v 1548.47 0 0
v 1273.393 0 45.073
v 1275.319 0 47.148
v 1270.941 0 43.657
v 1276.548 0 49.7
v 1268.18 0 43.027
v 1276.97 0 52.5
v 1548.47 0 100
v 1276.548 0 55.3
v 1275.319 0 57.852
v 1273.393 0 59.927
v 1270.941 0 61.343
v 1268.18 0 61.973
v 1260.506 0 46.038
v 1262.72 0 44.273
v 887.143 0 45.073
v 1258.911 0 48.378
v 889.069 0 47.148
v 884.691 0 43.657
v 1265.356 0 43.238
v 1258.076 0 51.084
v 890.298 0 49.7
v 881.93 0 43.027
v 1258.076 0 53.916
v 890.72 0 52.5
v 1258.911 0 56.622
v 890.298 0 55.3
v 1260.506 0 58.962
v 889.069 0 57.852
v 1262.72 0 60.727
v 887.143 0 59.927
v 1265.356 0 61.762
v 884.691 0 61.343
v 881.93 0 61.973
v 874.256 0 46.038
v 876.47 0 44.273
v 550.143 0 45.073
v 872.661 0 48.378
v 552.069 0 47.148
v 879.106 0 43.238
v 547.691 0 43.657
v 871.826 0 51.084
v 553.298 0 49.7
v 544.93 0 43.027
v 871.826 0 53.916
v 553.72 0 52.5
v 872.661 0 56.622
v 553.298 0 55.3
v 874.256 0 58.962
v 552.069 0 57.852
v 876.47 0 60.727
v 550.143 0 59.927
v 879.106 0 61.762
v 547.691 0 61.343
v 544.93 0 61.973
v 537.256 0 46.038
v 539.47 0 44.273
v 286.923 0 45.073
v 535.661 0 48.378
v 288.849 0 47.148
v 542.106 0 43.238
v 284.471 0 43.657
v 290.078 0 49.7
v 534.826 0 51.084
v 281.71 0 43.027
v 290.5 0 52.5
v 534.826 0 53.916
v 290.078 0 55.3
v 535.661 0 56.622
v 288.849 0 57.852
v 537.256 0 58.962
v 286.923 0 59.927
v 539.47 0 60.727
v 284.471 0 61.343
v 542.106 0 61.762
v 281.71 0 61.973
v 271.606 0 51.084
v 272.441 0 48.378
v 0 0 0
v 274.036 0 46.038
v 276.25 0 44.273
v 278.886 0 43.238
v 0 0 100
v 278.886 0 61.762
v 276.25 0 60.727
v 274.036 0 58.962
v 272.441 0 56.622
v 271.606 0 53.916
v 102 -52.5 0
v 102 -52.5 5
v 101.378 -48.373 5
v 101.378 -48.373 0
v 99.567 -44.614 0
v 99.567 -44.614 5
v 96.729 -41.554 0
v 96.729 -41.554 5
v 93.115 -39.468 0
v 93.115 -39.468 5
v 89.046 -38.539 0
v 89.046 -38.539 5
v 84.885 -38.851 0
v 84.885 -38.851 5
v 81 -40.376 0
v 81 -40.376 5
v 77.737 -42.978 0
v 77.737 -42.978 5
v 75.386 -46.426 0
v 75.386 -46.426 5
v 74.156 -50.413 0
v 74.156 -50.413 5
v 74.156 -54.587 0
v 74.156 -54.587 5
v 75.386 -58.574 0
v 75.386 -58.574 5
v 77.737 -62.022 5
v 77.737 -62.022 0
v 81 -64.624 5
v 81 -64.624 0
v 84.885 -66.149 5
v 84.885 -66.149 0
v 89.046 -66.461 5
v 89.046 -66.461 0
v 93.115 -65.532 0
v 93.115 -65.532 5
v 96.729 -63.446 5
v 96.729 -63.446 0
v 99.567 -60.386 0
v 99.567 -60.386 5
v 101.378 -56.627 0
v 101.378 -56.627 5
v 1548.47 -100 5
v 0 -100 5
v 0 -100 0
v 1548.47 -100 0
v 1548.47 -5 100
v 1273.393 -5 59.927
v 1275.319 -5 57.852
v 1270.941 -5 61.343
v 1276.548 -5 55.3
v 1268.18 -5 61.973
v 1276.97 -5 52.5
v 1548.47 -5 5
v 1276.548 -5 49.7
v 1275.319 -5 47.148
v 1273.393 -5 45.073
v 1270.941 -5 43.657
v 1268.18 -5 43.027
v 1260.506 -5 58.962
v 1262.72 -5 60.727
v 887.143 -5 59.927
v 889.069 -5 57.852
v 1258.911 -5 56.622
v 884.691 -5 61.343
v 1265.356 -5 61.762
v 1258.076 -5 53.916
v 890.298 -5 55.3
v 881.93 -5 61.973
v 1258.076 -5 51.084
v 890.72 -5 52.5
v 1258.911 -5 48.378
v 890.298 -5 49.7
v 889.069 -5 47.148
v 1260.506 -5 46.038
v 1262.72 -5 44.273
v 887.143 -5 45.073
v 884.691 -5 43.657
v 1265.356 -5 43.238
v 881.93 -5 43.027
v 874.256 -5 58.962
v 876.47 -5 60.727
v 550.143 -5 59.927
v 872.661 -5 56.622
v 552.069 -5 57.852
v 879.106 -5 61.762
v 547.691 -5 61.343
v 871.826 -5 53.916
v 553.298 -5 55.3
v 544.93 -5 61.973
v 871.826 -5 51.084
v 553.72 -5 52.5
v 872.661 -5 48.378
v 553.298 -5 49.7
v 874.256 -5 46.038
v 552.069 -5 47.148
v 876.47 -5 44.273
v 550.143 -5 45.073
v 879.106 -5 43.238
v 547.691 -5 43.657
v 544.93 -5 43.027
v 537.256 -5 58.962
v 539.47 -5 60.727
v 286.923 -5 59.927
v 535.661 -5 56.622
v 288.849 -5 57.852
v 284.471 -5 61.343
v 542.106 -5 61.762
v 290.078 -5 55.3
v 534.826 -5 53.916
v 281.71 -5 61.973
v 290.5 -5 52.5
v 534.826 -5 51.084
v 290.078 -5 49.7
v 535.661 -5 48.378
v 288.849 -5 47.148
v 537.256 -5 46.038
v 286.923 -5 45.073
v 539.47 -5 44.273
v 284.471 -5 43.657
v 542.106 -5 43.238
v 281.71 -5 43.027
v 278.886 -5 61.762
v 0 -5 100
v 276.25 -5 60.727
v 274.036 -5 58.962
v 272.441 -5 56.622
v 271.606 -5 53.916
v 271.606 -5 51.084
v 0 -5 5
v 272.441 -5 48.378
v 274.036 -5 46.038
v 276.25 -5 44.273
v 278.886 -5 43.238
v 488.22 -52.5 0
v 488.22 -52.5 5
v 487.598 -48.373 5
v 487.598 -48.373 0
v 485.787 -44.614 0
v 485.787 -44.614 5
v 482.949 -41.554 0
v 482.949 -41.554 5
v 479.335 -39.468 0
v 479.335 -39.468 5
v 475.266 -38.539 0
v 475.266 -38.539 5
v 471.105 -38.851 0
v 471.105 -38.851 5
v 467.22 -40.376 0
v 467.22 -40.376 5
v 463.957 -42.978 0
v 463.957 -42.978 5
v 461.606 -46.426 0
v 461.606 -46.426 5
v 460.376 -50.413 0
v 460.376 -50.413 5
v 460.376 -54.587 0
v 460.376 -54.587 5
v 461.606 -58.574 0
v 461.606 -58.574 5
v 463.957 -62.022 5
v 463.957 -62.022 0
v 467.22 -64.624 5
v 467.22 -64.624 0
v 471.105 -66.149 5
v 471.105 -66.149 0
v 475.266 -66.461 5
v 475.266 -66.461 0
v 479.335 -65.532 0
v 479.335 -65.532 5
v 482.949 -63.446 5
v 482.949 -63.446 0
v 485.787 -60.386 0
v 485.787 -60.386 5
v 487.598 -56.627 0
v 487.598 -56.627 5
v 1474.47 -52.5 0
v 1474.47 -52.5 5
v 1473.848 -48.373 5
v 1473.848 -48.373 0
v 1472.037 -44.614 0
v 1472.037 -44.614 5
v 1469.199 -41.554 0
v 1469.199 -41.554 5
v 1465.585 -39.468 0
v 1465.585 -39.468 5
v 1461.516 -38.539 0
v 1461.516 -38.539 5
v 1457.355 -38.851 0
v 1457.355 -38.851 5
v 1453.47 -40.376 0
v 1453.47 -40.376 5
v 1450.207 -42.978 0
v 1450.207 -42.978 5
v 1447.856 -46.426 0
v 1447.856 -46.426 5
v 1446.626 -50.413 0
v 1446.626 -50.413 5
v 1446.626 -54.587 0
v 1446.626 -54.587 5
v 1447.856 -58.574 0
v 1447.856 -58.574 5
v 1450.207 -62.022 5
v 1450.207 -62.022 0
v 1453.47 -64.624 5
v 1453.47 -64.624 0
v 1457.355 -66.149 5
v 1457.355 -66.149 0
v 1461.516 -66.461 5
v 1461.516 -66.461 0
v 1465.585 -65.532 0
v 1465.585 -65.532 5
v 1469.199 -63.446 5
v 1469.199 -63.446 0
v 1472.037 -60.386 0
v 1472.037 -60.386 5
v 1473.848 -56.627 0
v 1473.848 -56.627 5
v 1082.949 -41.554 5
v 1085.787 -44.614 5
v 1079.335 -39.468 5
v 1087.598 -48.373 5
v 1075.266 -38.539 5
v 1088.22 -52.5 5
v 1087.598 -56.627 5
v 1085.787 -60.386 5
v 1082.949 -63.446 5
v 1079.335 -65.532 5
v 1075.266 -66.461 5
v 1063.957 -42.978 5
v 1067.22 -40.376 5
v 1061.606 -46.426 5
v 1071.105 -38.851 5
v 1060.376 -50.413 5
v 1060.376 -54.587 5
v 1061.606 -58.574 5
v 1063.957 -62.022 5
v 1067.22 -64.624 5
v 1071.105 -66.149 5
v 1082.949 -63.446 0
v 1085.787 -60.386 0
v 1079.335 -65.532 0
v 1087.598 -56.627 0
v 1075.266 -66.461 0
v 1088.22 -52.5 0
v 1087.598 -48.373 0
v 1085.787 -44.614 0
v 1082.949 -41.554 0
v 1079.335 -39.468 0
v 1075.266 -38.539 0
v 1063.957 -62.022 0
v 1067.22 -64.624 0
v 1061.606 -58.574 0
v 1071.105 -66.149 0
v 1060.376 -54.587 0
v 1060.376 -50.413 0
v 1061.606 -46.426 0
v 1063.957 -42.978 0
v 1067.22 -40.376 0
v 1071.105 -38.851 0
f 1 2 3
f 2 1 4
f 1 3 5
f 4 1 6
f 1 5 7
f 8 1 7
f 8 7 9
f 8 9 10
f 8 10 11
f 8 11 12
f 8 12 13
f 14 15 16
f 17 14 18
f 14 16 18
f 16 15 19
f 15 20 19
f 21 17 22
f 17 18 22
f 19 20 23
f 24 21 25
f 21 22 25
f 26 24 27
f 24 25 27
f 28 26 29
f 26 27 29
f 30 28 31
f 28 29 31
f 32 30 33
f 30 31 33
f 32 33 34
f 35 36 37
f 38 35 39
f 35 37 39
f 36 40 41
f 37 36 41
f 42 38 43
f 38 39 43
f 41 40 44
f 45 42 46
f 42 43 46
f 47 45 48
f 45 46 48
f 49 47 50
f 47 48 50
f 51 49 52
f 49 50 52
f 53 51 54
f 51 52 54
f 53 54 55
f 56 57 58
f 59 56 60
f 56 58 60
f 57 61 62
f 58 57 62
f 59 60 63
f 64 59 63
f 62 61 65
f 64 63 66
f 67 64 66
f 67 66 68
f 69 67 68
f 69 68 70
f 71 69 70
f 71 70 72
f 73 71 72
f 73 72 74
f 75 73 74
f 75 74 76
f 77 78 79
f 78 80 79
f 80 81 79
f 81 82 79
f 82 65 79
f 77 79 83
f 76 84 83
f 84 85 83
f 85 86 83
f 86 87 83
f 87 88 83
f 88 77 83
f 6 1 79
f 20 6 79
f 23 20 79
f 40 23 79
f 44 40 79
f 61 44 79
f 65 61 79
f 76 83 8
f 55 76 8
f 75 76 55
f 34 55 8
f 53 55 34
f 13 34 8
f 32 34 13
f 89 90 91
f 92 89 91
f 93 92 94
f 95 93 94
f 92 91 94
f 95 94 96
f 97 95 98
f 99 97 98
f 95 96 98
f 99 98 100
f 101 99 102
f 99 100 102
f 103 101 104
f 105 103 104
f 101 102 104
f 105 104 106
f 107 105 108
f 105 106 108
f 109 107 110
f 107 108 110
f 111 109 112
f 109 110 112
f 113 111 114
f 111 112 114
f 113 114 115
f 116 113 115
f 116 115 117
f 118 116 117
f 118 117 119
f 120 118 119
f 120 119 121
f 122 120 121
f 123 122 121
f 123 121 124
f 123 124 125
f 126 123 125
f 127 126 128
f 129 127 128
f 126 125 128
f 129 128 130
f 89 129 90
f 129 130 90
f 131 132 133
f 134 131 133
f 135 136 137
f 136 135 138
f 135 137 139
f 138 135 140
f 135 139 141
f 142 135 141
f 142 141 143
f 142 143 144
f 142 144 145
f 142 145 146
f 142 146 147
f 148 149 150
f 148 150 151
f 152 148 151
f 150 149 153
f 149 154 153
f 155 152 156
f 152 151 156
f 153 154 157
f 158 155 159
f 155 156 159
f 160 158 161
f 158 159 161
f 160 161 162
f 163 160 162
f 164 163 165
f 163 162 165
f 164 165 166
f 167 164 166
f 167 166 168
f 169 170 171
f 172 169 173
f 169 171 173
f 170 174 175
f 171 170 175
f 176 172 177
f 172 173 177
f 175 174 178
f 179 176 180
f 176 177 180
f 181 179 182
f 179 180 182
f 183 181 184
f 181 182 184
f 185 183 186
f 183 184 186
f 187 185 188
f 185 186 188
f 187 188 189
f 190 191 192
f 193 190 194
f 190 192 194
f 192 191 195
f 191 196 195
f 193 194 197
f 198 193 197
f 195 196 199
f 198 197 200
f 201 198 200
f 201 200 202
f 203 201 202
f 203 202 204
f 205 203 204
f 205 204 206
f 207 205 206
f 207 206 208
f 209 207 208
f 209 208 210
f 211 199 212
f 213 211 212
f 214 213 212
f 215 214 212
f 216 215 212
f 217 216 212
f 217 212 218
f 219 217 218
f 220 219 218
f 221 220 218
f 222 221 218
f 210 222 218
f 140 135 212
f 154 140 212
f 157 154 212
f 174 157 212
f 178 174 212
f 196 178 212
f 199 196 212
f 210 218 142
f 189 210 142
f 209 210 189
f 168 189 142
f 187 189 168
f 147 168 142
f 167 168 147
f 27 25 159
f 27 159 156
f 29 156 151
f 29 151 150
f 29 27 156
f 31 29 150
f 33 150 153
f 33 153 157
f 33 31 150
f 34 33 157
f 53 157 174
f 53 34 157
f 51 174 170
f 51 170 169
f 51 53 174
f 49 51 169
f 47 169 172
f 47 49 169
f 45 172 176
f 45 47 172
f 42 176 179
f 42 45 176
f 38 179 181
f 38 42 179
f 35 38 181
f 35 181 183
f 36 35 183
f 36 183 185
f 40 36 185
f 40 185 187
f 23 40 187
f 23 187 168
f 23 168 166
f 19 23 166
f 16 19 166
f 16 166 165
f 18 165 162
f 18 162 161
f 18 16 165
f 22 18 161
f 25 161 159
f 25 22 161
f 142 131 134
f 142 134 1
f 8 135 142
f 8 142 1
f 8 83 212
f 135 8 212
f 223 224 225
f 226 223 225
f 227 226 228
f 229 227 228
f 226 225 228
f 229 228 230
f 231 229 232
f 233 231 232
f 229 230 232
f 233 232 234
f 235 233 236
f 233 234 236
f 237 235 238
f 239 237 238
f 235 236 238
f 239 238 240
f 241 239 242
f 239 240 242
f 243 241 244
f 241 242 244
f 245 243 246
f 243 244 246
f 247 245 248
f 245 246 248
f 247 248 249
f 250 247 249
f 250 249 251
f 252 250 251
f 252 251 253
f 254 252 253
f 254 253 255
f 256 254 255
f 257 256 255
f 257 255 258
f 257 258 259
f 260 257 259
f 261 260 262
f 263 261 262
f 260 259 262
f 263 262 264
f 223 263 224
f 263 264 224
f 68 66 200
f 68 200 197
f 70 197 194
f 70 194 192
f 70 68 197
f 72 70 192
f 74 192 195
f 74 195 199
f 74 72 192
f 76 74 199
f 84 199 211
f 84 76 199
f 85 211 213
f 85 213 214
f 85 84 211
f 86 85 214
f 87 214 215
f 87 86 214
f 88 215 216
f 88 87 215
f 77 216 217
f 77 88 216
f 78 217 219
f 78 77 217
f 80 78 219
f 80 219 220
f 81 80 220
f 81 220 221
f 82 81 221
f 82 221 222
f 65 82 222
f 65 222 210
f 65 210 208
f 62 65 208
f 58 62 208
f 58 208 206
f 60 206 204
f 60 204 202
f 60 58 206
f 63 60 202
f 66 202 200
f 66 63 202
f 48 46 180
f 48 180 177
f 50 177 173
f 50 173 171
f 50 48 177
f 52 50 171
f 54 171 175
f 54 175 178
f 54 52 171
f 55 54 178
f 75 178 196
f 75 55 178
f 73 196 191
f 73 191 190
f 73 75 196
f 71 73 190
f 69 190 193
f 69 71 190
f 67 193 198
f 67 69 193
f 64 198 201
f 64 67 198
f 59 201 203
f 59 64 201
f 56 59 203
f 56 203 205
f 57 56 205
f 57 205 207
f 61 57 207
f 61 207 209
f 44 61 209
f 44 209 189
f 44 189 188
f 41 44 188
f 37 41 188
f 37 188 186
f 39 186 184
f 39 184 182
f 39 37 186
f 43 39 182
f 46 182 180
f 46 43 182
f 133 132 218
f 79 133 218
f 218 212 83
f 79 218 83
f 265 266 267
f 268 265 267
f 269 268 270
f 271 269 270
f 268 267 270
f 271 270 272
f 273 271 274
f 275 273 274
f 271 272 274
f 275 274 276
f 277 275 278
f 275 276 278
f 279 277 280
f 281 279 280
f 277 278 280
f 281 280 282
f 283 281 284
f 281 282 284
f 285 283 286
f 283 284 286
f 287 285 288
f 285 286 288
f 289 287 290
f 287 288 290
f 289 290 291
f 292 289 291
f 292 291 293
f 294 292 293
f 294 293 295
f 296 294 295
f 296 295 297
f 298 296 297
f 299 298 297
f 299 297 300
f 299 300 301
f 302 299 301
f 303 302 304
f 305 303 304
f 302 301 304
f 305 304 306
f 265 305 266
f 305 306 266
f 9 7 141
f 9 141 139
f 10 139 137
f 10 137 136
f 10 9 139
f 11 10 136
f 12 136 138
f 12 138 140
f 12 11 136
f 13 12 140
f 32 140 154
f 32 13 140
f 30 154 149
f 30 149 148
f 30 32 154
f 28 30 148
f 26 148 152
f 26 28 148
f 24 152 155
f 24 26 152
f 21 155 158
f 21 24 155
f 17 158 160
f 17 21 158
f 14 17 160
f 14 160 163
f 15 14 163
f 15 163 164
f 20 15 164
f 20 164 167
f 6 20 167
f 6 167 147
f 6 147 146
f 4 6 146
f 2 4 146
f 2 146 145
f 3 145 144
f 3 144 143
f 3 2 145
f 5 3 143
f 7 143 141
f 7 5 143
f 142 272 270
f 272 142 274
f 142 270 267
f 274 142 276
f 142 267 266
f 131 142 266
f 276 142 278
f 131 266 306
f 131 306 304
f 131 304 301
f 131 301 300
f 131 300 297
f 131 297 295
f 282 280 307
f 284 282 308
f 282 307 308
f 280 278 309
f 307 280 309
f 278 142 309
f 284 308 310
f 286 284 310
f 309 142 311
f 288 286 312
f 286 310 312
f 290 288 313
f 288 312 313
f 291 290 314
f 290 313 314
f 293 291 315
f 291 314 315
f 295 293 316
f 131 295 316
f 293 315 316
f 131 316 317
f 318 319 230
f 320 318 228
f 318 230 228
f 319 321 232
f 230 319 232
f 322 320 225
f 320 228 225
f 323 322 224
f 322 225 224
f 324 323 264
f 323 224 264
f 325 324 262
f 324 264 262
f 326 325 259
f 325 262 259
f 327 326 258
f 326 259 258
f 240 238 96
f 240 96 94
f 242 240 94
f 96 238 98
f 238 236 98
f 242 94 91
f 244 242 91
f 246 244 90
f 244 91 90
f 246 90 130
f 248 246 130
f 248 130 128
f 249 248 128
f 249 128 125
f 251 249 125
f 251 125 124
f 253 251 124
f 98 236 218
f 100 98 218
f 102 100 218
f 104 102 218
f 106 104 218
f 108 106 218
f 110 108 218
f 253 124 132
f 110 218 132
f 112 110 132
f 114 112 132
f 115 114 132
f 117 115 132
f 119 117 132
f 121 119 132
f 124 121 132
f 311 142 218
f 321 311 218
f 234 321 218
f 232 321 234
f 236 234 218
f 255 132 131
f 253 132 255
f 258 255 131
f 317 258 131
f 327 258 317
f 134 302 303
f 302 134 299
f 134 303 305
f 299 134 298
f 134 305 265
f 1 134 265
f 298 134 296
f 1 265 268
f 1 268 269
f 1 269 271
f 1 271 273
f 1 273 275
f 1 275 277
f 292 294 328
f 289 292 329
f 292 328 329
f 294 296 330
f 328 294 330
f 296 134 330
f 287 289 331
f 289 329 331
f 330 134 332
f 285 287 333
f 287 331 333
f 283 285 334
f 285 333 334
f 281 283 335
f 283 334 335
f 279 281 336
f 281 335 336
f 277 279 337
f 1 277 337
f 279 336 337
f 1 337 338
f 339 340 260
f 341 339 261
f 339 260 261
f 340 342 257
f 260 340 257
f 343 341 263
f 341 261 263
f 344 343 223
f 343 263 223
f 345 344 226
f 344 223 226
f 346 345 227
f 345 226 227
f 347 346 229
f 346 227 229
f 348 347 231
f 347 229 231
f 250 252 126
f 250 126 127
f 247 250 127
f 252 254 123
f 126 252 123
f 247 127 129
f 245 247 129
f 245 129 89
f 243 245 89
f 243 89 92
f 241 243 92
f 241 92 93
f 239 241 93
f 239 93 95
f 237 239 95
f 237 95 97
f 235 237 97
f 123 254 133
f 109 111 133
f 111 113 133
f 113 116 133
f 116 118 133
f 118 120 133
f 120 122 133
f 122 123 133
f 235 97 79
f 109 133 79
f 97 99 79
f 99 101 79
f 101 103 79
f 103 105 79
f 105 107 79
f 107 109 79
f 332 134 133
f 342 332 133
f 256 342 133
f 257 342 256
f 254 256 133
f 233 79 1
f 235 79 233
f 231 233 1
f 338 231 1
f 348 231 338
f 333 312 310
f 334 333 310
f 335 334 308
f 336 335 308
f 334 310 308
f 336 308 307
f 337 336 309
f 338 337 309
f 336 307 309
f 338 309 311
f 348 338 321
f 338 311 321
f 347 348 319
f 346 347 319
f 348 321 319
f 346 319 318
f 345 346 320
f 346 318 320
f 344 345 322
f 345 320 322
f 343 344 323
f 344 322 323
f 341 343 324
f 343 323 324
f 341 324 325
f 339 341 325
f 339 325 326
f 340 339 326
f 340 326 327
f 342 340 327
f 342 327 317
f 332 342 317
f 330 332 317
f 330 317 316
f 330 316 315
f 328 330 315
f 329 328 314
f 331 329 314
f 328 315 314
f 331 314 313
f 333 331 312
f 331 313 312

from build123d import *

# Parameters (mm, degrees)
F1_DEPTH = 1548.47
F2_R     = 14
F3_DEPTH = 5
F4_R     = 9.5
F5_DEPTH = 5


with BuildPart() as f1:
    # F0 (on Right) → F1 (new body)
    with BuildSketch(Plane.YZ):
        Polygon((0, 0), (0, 100), (-5, 100), (-5, 5), (-100, 5), (-100, 0), align=None)
    extrude(amount=F1_DEPTH)

    # F2 (on face) → F3 (cut, through all)
    with BuildSketch(Plane.XY.offset(5)):
        with Locations((474.22, -52.5)):
            Circle(F2_R)
        with Locations((1074.22, -52.5)):
            Circle(F2_R)
        with Locations((1460.47, -52.5)):
            Circle(F2_R)
        with Locations((88, -52.5)):
            Circle(F2_R)
    extrude(amount=-F3_DEPTH, mode=Mode.SUBTRACT)

    # F4 (on Front) → F5 (cut, through all)
    with BuildSketch(Plane.XZ):
        with Locations((1267.47, 52.5)):
            Circle(F4_R)
        with Locations((881.22, 52.5)):
            Circle(F4_R)
        with Locations((544.22, 52.5)):
            Circle(F4_R)
        with Locations((281, 52.5)):
            Circle(F4_R)
    extrude(amount=F5_DEPTH, mode=Mode.SUBTRACT)


solid = f1.part
